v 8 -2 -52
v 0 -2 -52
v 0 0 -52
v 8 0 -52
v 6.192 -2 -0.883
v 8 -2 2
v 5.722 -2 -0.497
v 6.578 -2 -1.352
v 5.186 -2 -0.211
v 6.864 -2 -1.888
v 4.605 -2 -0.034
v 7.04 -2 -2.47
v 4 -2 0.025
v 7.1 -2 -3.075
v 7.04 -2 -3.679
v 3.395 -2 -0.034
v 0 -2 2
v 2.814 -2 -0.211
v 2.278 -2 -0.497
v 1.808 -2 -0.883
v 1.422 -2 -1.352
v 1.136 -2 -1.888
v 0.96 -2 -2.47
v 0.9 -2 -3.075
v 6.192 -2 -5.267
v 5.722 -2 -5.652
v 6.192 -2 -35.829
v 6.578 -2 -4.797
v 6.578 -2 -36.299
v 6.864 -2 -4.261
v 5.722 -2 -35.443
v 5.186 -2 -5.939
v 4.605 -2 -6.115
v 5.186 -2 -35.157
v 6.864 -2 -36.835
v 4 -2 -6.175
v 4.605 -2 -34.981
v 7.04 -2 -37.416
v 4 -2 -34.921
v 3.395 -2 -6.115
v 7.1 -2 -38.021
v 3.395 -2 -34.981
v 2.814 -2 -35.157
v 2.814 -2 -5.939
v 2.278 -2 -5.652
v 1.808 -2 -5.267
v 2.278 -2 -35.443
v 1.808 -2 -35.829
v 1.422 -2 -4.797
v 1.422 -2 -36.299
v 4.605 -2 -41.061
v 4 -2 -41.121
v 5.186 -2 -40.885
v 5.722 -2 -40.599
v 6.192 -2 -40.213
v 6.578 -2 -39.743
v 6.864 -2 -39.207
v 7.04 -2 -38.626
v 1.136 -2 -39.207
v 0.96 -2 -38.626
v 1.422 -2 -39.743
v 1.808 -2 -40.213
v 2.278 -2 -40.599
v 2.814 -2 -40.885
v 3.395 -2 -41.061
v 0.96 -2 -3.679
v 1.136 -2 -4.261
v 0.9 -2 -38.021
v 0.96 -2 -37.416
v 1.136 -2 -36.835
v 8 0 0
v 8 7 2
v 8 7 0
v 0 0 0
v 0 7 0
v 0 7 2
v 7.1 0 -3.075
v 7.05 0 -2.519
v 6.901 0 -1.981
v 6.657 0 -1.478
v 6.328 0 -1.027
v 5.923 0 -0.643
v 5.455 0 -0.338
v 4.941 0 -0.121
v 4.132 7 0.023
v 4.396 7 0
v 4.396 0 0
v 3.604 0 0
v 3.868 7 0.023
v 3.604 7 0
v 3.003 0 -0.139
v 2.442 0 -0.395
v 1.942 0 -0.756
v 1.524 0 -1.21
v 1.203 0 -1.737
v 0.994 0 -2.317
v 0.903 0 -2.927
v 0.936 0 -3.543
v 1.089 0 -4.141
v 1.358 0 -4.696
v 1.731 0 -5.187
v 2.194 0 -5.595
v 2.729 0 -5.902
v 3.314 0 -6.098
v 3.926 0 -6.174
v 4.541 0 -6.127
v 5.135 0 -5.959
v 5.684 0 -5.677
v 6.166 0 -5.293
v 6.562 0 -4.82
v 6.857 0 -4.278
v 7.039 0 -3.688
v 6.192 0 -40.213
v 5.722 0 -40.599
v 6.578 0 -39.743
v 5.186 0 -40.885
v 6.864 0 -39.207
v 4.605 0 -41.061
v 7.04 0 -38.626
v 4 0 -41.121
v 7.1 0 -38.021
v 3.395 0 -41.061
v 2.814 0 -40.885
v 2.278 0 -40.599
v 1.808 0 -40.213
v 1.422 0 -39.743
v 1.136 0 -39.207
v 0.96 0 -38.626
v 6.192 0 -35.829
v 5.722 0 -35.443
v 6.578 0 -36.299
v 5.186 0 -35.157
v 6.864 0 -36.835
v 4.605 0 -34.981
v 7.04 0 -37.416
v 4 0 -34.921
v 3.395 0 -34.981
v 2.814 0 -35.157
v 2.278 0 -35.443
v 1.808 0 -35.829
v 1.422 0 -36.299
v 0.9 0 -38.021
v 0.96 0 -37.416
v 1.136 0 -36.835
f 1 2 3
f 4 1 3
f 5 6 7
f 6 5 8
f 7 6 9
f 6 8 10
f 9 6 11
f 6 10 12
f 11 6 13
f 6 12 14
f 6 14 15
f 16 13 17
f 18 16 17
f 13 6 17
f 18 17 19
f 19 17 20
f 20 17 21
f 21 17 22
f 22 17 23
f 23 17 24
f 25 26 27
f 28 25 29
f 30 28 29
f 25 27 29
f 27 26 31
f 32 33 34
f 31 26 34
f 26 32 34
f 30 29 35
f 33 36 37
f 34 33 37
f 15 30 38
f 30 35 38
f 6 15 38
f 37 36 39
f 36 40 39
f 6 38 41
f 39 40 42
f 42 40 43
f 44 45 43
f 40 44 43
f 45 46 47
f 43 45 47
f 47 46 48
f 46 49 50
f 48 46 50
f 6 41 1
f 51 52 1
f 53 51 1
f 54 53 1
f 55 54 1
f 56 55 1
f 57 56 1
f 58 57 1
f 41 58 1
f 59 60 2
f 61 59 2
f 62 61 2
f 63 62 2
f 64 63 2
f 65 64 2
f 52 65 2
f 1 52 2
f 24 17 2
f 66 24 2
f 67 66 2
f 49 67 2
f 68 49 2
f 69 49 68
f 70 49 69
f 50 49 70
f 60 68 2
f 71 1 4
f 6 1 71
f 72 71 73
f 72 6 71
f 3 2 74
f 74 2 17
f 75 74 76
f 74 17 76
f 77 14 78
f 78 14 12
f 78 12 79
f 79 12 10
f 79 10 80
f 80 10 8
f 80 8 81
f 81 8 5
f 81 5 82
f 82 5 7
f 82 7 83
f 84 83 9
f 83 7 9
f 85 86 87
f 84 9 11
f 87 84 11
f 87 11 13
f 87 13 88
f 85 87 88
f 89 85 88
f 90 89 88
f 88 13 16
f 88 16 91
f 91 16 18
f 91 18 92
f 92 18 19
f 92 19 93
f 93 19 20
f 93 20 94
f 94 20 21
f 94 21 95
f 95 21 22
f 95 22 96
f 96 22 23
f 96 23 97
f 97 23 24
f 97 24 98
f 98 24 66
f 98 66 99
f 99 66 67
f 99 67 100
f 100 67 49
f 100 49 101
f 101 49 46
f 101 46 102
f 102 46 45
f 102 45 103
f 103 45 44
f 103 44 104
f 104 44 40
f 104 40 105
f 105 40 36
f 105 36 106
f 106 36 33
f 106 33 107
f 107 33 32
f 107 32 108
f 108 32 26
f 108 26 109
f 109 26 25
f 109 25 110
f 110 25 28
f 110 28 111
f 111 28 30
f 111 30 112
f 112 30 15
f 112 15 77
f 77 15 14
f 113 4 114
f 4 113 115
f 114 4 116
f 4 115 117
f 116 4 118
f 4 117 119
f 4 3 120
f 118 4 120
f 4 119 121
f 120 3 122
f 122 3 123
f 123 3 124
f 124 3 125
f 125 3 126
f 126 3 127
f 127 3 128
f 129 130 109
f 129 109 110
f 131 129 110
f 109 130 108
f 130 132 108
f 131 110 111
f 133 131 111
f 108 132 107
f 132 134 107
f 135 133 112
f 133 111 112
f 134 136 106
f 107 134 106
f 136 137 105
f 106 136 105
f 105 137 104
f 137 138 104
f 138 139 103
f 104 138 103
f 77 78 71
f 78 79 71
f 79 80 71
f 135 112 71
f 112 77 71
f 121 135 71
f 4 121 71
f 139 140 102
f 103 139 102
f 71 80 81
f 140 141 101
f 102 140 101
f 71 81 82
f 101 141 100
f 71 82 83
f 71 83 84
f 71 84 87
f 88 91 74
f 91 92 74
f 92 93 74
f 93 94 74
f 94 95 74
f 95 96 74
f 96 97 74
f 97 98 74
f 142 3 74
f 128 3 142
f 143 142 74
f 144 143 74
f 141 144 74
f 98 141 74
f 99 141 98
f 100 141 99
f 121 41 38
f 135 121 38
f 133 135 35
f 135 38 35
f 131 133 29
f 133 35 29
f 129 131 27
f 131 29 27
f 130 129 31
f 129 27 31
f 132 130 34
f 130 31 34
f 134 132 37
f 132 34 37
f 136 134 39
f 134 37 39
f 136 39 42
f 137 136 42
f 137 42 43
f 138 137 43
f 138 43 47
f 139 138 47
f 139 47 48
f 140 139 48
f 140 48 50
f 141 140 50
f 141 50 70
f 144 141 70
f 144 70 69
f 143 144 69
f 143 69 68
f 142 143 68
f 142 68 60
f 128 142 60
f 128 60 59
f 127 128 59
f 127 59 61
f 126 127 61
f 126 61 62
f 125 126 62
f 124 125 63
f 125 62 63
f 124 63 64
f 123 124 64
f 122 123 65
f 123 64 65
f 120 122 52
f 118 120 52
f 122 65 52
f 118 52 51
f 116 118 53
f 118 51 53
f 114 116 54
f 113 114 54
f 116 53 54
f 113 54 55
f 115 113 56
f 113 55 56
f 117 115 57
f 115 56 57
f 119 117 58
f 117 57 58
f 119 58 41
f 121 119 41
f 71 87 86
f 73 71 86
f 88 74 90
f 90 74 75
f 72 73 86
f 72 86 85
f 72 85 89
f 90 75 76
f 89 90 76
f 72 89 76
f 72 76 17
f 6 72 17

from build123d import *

# Parameters (mm, degrees)
F1_DEPTH = 8
F2_R     = 3.1
F3_DEPTH = 25


with BuildPart() as f1:
    # F0 (on Right) → F1 (new body)
    with BuildSketch(Plane.YZ):
        Polygon((0, -52), (0, 0), (7, 0), (7, 2), (-2, 2), (-2, -52), align=None)
    extrude(amount=F1_DEPTH)

    # F2 (on face) → F3 (cut)
    with BuildSketch(Plane.XZ.offset(2)):
        with Locations((4, -3.074622)):
            Circle(F2_R)
        with Locations((4, -38.02098)):
            Circle(F2_R)
    extrude(amount=-F3_DEPTH, mode=Mode.SUBTRACT)


solid = f1.part
